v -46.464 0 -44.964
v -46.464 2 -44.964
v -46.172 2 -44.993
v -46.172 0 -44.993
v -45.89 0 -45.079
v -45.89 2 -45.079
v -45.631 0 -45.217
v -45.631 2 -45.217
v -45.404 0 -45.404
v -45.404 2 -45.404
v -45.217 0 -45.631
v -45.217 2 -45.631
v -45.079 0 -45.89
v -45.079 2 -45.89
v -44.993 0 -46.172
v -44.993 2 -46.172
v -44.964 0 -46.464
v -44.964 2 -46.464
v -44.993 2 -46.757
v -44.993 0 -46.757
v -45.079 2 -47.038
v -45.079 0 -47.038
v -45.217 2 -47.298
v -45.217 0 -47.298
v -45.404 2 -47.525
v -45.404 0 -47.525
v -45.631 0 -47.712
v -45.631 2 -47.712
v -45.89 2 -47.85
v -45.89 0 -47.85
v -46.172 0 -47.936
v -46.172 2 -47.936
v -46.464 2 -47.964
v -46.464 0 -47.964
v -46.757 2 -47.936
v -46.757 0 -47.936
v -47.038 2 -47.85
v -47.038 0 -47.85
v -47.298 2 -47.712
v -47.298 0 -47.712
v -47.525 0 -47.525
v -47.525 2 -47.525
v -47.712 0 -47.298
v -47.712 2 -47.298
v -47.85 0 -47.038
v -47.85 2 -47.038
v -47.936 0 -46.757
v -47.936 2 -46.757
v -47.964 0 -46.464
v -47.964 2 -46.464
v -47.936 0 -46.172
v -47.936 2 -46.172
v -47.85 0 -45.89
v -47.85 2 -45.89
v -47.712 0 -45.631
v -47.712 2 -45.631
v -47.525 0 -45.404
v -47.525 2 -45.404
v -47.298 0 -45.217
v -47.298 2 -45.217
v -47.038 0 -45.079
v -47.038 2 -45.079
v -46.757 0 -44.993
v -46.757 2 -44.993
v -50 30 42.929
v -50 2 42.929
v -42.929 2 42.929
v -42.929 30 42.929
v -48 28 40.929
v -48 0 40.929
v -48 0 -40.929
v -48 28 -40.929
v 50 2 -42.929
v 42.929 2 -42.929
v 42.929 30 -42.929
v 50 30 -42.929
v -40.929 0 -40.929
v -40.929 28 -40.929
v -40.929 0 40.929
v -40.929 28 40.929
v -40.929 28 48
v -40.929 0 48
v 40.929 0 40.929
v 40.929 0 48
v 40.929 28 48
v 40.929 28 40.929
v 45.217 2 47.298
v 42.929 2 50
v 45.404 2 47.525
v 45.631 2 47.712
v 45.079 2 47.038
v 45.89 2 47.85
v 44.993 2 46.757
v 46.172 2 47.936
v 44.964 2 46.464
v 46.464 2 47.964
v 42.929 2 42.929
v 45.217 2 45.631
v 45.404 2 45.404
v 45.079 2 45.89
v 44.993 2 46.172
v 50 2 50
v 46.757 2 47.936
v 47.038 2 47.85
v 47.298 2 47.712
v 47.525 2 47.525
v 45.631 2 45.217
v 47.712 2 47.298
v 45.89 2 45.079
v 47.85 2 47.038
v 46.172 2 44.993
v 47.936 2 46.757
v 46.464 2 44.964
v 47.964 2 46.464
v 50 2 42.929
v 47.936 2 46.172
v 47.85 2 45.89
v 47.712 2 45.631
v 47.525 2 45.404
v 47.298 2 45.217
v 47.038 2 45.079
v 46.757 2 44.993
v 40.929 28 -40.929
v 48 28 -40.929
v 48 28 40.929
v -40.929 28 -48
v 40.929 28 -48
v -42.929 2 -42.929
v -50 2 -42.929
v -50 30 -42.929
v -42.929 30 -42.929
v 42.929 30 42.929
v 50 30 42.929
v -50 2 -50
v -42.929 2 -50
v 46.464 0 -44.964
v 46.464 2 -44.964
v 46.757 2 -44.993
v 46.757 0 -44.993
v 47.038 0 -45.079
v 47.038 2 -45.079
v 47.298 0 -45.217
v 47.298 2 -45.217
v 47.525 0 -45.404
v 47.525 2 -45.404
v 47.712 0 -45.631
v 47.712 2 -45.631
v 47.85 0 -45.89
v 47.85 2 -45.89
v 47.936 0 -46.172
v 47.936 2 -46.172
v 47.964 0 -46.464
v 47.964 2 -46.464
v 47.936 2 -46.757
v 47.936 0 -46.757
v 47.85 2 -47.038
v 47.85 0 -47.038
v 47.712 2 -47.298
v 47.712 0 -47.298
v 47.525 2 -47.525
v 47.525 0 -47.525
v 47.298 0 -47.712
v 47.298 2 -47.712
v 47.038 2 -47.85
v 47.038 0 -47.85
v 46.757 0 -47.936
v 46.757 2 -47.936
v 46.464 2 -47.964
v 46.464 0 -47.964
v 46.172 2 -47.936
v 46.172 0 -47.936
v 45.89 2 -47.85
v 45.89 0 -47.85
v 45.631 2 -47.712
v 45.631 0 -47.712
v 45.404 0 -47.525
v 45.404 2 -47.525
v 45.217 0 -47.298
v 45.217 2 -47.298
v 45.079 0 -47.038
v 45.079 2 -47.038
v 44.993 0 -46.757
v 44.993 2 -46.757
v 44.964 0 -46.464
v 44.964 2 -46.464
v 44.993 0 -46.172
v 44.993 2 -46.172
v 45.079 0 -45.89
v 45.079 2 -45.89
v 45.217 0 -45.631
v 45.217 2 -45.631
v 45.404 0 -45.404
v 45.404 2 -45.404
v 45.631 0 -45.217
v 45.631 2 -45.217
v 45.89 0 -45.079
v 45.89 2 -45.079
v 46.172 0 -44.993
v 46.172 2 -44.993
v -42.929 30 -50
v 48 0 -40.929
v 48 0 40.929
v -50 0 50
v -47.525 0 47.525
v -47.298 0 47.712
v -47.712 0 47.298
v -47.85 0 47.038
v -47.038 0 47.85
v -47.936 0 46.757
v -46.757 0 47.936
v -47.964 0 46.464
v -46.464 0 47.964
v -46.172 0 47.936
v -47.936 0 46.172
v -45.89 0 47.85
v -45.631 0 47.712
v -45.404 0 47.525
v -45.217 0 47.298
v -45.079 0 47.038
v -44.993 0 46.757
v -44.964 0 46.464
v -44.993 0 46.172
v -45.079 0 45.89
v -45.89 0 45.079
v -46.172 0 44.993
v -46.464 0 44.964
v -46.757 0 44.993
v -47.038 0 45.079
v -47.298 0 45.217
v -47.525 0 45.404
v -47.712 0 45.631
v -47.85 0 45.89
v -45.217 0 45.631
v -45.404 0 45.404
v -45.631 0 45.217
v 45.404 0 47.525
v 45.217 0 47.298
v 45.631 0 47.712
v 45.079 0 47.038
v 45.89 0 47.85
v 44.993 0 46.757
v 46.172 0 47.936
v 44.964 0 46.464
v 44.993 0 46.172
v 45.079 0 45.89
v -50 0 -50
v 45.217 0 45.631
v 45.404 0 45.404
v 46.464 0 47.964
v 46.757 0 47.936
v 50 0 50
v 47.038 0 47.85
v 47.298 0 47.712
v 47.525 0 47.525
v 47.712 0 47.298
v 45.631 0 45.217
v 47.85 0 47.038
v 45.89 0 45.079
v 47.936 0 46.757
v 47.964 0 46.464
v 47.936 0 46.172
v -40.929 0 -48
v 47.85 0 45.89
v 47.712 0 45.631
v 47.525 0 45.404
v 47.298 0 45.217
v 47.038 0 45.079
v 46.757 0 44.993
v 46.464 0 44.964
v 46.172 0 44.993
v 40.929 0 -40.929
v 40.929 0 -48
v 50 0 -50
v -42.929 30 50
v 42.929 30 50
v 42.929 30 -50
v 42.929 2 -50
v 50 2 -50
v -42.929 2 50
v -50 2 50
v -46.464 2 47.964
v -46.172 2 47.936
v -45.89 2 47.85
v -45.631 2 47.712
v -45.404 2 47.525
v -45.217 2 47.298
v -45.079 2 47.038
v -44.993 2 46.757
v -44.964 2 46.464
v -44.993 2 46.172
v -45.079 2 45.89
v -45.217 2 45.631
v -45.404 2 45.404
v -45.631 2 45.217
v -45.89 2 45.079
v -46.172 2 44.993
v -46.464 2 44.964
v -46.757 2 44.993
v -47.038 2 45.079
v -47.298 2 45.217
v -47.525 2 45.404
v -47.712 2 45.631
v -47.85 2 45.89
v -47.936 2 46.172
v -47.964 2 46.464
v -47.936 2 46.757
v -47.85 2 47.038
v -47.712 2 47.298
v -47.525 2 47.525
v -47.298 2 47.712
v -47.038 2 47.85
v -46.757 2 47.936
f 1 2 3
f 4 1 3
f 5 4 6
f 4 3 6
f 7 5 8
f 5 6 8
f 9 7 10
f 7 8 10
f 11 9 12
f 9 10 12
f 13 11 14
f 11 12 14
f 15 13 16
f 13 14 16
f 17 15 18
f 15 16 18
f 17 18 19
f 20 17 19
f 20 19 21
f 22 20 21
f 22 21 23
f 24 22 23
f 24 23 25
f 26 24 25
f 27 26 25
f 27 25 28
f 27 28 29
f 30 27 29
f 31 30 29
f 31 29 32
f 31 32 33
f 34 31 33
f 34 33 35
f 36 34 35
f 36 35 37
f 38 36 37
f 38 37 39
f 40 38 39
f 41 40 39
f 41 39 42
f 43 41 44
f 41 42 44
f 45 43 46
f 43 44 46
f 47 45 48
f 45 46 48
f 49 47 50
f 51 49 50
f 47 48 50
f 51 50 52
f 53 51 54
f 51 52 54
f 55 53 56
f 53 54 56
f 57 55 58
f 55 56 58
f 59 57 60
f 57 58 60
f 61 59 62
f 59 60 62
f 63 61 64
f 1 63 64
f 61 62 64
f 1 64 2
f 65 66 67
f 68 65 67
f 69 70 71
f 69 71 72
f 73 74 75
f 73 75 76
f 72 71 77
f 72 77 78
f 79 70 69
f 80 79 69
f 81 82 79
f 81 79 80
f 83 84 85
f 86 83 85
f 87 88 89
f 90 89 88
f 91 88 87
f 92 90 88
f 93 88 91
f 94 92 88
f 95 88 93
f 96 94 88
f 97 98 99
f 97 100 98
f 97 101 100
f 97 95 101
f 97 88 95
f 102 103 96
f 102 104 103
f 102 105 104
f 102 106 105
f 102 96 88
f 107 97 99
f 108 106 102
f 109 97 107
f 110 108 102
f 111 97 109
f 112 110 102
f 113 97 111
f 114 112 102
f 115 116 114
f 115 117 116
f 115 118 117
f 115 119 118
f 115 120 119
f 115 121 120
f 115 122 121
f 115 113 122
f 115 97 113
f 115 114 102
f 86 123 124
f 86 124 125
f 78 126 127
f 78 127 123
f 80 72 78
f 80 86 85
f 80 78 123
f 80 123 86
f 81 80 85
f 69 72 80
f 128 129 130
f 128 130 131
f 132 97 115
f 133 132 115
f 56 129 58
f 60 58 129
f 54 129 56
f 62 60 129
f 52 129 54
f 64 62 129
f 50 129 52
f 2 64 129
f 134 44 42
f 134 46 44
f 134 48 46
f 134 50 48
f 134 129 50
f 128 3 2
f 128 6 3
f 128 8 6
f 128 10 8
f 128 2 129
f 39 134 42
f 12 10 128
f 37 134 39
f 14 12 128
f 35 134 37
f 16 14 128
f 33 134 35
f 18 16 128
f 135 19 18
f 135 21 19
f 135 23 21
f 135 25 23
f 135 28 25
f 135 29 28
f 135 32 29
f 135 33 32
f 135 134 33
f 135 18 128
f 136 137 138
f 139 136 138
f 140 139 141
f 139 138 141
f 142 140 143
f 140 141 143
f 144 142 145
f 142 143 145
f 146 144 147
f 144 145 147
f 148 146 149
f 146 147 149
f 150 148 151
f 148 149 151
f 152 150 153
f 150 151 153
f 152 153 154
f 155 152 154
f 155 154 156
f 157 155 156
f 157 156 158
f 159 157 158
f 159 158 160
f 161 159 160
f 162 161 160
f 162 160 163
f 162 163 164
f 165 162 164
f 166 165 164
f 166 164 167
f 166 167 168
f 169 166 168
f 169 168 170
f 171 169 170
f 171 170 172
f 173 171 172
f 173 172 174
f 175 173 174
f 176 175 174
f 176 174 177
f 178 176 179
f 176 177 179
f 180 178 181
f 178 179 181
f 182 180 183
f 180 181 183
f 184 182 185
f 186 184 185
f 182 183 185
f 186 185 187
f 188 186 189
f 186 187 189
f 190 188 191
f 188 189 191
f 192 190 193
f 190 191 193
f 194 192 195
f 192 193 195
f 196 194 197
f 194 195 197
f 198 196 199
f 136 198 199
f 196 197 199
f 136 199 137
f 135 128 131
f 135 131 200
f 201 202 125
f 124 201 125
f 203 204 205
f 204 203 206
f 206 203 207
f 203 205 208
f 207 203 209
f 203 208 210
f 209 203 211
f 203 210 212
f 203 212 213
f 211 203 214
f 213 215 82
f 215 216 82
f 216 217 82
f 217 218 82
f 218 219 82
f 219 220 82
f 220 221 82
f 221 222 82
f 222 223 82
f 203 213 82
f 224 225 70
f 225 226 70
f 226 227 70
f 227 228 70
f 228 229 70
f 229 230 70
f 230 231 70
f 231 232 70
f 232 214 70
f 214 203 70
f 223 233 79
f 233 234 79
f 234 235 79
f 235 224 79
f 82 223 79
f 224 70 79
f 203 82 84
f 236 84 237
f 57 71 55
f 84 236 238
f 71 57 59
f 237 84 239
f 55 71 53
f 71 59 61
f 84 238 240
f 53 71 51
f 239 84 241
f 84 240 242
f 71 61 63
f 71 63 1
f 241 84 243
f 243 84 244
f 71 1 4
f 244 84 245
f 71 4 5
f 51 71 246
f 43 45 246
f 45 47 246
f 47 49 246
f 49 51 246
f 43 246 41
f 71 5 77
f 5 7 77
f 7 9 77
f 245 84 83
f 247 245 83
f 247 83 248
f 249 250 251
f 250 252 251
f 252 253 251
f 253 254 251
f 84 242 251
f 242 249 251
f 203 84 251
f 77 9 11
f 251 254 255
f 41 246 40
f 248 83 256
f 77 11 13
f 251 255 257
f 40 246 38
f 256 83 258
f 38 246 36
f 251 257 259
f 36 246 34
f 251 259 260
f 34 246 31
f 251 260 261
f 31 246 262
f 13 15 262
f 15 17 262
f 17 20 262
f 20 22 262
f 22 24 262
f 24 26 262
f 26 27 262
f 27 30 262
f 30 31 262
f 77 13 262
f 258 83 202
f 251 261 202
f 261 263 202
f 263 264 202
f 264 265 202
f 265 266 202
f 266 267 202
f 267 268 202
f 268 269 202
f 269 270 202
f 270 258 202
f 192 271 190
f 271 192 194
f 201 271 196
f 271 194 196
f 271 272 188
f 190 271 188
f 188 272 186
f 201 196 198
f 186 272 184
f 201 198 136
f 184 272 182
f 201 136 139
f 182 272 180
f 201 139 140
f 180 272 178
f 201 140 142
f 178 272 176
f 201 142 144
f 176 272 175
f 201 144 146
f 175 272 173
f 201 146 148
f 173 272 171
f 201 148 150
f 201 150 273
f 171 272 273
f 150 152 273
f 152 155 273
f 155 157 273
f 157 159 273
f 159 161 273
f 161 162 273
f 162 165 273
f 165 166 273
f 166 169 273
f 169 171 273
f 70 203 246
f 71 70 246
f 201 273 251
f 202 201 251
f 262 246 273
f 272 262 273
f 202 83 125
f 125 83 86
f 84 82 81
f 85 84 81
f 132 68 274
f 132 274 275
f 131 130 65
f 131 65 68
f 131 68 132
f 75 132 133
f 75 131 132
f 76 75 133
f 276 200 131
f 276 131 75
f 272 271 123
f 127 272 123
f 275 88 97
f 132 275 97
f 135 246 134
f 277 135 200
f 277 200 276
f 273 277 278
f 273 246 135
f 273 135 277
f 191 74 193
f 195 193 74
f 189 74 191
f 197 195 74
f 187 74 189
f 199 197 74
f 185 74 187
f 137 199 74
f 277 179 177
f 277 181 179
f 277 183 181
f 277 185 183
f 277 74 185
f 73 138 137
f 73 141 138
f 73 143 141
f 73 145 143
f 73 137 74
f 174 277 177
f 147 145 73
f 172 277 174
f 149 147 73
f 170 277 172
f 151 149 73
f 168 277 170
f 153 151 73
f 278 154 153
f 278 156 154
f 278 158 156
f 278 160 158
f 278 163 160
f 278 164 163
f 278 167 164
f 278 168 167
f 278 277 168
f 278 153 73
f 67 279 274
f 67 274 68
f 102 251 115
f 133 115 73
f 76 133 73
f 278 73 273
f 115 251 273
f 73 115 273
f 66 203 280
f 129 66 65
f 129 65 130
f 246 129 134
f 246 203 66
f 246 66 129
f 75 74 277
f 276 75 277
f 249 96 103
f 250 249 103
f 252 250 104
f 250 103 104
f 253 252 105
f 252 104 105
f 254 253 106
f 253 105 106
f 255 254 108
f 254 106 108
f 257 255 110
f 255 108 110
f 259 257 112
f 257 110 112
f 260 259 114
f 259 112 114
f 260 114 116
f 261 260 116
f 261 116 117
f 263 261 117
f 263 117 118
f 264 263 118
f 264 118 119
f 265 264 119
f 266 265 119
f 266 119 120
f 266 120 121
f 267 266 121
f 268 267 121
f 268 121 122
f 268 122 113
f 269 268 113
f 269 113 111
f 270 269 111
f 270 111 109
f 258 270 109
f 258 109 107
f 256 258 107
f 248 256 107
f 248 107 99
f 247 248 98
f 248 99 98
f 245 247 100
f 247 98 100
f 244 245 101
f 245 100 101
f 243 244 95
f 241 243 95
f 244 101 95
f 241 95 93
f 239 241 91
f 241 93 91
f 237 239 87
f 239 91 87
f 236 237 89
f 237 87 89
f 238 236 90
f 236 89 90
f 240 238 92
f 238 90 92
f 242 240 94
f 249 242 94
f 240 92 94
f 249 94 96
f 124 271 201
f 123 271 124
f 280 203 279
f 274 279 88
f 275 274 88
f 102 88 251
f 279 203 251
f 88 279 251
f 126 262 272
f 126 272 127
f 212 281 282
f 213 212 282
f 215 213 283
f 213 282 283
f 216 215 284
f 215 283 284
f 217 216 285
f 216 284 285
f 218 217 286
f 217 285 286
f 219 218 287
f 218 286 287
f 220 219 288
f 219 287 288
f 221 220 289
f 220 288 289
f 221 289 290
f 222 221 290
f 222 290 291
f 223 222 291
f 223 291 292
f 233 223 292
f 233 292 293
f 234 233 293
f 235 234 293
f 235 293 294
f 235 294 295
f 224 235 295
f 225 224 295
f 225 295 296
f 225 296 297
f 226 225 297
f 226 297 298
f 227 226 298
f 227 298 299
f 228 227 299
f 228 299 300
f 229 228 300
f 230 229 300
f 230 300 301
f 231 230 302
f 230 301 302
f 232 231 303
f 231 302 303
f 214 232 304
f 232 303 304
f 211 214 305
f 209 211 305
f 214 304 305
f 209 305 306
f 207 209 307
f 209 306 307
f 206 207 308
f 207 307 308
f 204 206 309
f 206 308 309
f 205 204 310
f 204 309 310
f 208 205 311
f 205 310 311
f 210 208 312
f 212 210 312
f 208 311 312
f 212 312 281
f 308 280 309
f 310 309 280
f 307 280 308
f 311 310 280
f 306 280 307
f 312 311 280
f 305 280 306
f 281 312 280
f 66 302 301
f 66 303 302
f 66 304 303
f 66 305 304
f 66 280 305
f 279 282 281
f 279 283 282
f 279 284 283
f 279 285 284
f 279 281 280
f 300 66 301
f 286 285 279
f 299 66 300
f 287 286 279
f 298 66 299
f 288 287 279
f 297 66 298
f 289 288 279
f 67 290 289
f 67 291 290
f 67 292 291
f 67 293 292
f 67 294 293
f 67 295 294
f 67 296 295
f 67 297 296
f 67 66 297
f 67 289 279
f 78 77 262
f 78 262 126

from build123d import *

# Parameters (mm, degrees)
CROQUIS1_W              = 100
CROQUIS1_H              = 100
SALIENTE_EXTRUIR1_DEPTH = 30
CROQUIS2_R              = 1.5
CORTAR_EXTRUIR1_DEPTH   = 38
CROQUIS3_W              = 7.071067812
CROQUIS3_H              = 7.071067812
CORTAR_EXTRUIR2_DEPTH   = 28
VACIADO1_START          = -48
VACIADO1_OUTLINE_W      = 28
VACIADO1_OUTLINE_H      = 81.857864376
VACIADO1_DEPTH          = 96
VACIADO1_START_2        = -40.928932188
VACIADO1_2_OUTLINE_W    = 28
VACIADO1_2_OUTLINE_H    = 7.071067812
VACIADO1_2_DEPTH        = 81.857864376


# Read off the part's stored shape, not the designer's step: Vaciado1
with BuildPart() as part:
    # Croquis1 → Saliente-Extruir1 (new body)
    with BuildSketch(Plane(origin=(0, 0, 0), x_dir=(1, 0, 0), z_dir=(0, 1, 0))):
        Rectangle(CROQUIS1_W, CROQUIS1_H)
    extrude(amount=SALIENTE_EXTRUIR1_DEPTH)

    # Croquis2 → Cortar-Extruir1 (cut)
    with BuildSketch(Plane(origin=(0, 30, 0), x_dir=(1, 0, 0), z_dir=(0, 1, 0))):
        with Locations(Location((-46.464466094, -46.464466094, 0), (0, 0, 270))):
            Circle(CROQUIS2_R)
        with Locations(Location((-46.464466094, 46.464466094, 0), (0, 0, 270))):
            Circle(CROQUIS2_R)
        with Locations(Location((46.464466094, 46.464466094, 0), (0, 0, 270))):
            Circle(CROQUIS2_R)
        with Locations(Location((46.464466094, -46.464466094, 0), (0, 0, 270))):
            Circle(CROQUIS2_R)
    extrude(amount=-CORTAR_EXTRUIR1_DEPTH, mode=Mode.SUBTRACT)

    # Croquis3 → Cortar-Extruir2 (cut)
    with BuildSketch(Plane(origin=(0, 30, 0), x_dir=(1, 0, 0), z_dir=(0, 1, 0))):
        with Locations((-46.464466094, -46.464466094)):
            Rectangle(CROQUIS3_W, CROQUIS3_H)
        with Locations((-46.464466094, 46.464466094)):
            Rectangle(CROQUIS3_W, CROQUIS3_H)
        with Locations((46.464466094, 46.464466094)):
            Rectangle(CROQUIS3_W, CROQUIS3_H)
        with Locations((46.464466094, -46.464466094)):
            Rectangle(CROQUIS3_W, CROQUIS3_H)
    extrude(amount=-CORTAR_EXTRUIR2_DEPTH, mode=Mode.SUBTRACT)

    # Vaciado1 outline → Vaciado1 (cut)
    with BuildSketch(Plane.YZ.offset(VACIADO1_START)):
        with Locations((14, 0)):
            Rectangle(VACIADO1_OUTLINE_W, VACIADO1_OUTLINE_H)
    extrude(amount=VACIADO1_DEPTH, mode=Mode.SUBTRACT)

    # Vaciado1 2 outline → Vaciado1 2 (cut)
    with BuildSketch(Plane.YZ.offset(VACIADO1_START_2)):
        with Locations((14, -44.464466094)):
            Rectangle(VACIADO1_2_OUTLINE_W, VACIADO1_2_OUTLINE_H)
        with Locations((14, 44.464466094)):
            Rectangle(VACIADO1_2_OUTLINE_W, VACIADO1_2_OUTLINE_H)
    extrude(amount=VACIADO1_2_DEPTH, mode=Mode.SUBTRACT)


solid = part.part
